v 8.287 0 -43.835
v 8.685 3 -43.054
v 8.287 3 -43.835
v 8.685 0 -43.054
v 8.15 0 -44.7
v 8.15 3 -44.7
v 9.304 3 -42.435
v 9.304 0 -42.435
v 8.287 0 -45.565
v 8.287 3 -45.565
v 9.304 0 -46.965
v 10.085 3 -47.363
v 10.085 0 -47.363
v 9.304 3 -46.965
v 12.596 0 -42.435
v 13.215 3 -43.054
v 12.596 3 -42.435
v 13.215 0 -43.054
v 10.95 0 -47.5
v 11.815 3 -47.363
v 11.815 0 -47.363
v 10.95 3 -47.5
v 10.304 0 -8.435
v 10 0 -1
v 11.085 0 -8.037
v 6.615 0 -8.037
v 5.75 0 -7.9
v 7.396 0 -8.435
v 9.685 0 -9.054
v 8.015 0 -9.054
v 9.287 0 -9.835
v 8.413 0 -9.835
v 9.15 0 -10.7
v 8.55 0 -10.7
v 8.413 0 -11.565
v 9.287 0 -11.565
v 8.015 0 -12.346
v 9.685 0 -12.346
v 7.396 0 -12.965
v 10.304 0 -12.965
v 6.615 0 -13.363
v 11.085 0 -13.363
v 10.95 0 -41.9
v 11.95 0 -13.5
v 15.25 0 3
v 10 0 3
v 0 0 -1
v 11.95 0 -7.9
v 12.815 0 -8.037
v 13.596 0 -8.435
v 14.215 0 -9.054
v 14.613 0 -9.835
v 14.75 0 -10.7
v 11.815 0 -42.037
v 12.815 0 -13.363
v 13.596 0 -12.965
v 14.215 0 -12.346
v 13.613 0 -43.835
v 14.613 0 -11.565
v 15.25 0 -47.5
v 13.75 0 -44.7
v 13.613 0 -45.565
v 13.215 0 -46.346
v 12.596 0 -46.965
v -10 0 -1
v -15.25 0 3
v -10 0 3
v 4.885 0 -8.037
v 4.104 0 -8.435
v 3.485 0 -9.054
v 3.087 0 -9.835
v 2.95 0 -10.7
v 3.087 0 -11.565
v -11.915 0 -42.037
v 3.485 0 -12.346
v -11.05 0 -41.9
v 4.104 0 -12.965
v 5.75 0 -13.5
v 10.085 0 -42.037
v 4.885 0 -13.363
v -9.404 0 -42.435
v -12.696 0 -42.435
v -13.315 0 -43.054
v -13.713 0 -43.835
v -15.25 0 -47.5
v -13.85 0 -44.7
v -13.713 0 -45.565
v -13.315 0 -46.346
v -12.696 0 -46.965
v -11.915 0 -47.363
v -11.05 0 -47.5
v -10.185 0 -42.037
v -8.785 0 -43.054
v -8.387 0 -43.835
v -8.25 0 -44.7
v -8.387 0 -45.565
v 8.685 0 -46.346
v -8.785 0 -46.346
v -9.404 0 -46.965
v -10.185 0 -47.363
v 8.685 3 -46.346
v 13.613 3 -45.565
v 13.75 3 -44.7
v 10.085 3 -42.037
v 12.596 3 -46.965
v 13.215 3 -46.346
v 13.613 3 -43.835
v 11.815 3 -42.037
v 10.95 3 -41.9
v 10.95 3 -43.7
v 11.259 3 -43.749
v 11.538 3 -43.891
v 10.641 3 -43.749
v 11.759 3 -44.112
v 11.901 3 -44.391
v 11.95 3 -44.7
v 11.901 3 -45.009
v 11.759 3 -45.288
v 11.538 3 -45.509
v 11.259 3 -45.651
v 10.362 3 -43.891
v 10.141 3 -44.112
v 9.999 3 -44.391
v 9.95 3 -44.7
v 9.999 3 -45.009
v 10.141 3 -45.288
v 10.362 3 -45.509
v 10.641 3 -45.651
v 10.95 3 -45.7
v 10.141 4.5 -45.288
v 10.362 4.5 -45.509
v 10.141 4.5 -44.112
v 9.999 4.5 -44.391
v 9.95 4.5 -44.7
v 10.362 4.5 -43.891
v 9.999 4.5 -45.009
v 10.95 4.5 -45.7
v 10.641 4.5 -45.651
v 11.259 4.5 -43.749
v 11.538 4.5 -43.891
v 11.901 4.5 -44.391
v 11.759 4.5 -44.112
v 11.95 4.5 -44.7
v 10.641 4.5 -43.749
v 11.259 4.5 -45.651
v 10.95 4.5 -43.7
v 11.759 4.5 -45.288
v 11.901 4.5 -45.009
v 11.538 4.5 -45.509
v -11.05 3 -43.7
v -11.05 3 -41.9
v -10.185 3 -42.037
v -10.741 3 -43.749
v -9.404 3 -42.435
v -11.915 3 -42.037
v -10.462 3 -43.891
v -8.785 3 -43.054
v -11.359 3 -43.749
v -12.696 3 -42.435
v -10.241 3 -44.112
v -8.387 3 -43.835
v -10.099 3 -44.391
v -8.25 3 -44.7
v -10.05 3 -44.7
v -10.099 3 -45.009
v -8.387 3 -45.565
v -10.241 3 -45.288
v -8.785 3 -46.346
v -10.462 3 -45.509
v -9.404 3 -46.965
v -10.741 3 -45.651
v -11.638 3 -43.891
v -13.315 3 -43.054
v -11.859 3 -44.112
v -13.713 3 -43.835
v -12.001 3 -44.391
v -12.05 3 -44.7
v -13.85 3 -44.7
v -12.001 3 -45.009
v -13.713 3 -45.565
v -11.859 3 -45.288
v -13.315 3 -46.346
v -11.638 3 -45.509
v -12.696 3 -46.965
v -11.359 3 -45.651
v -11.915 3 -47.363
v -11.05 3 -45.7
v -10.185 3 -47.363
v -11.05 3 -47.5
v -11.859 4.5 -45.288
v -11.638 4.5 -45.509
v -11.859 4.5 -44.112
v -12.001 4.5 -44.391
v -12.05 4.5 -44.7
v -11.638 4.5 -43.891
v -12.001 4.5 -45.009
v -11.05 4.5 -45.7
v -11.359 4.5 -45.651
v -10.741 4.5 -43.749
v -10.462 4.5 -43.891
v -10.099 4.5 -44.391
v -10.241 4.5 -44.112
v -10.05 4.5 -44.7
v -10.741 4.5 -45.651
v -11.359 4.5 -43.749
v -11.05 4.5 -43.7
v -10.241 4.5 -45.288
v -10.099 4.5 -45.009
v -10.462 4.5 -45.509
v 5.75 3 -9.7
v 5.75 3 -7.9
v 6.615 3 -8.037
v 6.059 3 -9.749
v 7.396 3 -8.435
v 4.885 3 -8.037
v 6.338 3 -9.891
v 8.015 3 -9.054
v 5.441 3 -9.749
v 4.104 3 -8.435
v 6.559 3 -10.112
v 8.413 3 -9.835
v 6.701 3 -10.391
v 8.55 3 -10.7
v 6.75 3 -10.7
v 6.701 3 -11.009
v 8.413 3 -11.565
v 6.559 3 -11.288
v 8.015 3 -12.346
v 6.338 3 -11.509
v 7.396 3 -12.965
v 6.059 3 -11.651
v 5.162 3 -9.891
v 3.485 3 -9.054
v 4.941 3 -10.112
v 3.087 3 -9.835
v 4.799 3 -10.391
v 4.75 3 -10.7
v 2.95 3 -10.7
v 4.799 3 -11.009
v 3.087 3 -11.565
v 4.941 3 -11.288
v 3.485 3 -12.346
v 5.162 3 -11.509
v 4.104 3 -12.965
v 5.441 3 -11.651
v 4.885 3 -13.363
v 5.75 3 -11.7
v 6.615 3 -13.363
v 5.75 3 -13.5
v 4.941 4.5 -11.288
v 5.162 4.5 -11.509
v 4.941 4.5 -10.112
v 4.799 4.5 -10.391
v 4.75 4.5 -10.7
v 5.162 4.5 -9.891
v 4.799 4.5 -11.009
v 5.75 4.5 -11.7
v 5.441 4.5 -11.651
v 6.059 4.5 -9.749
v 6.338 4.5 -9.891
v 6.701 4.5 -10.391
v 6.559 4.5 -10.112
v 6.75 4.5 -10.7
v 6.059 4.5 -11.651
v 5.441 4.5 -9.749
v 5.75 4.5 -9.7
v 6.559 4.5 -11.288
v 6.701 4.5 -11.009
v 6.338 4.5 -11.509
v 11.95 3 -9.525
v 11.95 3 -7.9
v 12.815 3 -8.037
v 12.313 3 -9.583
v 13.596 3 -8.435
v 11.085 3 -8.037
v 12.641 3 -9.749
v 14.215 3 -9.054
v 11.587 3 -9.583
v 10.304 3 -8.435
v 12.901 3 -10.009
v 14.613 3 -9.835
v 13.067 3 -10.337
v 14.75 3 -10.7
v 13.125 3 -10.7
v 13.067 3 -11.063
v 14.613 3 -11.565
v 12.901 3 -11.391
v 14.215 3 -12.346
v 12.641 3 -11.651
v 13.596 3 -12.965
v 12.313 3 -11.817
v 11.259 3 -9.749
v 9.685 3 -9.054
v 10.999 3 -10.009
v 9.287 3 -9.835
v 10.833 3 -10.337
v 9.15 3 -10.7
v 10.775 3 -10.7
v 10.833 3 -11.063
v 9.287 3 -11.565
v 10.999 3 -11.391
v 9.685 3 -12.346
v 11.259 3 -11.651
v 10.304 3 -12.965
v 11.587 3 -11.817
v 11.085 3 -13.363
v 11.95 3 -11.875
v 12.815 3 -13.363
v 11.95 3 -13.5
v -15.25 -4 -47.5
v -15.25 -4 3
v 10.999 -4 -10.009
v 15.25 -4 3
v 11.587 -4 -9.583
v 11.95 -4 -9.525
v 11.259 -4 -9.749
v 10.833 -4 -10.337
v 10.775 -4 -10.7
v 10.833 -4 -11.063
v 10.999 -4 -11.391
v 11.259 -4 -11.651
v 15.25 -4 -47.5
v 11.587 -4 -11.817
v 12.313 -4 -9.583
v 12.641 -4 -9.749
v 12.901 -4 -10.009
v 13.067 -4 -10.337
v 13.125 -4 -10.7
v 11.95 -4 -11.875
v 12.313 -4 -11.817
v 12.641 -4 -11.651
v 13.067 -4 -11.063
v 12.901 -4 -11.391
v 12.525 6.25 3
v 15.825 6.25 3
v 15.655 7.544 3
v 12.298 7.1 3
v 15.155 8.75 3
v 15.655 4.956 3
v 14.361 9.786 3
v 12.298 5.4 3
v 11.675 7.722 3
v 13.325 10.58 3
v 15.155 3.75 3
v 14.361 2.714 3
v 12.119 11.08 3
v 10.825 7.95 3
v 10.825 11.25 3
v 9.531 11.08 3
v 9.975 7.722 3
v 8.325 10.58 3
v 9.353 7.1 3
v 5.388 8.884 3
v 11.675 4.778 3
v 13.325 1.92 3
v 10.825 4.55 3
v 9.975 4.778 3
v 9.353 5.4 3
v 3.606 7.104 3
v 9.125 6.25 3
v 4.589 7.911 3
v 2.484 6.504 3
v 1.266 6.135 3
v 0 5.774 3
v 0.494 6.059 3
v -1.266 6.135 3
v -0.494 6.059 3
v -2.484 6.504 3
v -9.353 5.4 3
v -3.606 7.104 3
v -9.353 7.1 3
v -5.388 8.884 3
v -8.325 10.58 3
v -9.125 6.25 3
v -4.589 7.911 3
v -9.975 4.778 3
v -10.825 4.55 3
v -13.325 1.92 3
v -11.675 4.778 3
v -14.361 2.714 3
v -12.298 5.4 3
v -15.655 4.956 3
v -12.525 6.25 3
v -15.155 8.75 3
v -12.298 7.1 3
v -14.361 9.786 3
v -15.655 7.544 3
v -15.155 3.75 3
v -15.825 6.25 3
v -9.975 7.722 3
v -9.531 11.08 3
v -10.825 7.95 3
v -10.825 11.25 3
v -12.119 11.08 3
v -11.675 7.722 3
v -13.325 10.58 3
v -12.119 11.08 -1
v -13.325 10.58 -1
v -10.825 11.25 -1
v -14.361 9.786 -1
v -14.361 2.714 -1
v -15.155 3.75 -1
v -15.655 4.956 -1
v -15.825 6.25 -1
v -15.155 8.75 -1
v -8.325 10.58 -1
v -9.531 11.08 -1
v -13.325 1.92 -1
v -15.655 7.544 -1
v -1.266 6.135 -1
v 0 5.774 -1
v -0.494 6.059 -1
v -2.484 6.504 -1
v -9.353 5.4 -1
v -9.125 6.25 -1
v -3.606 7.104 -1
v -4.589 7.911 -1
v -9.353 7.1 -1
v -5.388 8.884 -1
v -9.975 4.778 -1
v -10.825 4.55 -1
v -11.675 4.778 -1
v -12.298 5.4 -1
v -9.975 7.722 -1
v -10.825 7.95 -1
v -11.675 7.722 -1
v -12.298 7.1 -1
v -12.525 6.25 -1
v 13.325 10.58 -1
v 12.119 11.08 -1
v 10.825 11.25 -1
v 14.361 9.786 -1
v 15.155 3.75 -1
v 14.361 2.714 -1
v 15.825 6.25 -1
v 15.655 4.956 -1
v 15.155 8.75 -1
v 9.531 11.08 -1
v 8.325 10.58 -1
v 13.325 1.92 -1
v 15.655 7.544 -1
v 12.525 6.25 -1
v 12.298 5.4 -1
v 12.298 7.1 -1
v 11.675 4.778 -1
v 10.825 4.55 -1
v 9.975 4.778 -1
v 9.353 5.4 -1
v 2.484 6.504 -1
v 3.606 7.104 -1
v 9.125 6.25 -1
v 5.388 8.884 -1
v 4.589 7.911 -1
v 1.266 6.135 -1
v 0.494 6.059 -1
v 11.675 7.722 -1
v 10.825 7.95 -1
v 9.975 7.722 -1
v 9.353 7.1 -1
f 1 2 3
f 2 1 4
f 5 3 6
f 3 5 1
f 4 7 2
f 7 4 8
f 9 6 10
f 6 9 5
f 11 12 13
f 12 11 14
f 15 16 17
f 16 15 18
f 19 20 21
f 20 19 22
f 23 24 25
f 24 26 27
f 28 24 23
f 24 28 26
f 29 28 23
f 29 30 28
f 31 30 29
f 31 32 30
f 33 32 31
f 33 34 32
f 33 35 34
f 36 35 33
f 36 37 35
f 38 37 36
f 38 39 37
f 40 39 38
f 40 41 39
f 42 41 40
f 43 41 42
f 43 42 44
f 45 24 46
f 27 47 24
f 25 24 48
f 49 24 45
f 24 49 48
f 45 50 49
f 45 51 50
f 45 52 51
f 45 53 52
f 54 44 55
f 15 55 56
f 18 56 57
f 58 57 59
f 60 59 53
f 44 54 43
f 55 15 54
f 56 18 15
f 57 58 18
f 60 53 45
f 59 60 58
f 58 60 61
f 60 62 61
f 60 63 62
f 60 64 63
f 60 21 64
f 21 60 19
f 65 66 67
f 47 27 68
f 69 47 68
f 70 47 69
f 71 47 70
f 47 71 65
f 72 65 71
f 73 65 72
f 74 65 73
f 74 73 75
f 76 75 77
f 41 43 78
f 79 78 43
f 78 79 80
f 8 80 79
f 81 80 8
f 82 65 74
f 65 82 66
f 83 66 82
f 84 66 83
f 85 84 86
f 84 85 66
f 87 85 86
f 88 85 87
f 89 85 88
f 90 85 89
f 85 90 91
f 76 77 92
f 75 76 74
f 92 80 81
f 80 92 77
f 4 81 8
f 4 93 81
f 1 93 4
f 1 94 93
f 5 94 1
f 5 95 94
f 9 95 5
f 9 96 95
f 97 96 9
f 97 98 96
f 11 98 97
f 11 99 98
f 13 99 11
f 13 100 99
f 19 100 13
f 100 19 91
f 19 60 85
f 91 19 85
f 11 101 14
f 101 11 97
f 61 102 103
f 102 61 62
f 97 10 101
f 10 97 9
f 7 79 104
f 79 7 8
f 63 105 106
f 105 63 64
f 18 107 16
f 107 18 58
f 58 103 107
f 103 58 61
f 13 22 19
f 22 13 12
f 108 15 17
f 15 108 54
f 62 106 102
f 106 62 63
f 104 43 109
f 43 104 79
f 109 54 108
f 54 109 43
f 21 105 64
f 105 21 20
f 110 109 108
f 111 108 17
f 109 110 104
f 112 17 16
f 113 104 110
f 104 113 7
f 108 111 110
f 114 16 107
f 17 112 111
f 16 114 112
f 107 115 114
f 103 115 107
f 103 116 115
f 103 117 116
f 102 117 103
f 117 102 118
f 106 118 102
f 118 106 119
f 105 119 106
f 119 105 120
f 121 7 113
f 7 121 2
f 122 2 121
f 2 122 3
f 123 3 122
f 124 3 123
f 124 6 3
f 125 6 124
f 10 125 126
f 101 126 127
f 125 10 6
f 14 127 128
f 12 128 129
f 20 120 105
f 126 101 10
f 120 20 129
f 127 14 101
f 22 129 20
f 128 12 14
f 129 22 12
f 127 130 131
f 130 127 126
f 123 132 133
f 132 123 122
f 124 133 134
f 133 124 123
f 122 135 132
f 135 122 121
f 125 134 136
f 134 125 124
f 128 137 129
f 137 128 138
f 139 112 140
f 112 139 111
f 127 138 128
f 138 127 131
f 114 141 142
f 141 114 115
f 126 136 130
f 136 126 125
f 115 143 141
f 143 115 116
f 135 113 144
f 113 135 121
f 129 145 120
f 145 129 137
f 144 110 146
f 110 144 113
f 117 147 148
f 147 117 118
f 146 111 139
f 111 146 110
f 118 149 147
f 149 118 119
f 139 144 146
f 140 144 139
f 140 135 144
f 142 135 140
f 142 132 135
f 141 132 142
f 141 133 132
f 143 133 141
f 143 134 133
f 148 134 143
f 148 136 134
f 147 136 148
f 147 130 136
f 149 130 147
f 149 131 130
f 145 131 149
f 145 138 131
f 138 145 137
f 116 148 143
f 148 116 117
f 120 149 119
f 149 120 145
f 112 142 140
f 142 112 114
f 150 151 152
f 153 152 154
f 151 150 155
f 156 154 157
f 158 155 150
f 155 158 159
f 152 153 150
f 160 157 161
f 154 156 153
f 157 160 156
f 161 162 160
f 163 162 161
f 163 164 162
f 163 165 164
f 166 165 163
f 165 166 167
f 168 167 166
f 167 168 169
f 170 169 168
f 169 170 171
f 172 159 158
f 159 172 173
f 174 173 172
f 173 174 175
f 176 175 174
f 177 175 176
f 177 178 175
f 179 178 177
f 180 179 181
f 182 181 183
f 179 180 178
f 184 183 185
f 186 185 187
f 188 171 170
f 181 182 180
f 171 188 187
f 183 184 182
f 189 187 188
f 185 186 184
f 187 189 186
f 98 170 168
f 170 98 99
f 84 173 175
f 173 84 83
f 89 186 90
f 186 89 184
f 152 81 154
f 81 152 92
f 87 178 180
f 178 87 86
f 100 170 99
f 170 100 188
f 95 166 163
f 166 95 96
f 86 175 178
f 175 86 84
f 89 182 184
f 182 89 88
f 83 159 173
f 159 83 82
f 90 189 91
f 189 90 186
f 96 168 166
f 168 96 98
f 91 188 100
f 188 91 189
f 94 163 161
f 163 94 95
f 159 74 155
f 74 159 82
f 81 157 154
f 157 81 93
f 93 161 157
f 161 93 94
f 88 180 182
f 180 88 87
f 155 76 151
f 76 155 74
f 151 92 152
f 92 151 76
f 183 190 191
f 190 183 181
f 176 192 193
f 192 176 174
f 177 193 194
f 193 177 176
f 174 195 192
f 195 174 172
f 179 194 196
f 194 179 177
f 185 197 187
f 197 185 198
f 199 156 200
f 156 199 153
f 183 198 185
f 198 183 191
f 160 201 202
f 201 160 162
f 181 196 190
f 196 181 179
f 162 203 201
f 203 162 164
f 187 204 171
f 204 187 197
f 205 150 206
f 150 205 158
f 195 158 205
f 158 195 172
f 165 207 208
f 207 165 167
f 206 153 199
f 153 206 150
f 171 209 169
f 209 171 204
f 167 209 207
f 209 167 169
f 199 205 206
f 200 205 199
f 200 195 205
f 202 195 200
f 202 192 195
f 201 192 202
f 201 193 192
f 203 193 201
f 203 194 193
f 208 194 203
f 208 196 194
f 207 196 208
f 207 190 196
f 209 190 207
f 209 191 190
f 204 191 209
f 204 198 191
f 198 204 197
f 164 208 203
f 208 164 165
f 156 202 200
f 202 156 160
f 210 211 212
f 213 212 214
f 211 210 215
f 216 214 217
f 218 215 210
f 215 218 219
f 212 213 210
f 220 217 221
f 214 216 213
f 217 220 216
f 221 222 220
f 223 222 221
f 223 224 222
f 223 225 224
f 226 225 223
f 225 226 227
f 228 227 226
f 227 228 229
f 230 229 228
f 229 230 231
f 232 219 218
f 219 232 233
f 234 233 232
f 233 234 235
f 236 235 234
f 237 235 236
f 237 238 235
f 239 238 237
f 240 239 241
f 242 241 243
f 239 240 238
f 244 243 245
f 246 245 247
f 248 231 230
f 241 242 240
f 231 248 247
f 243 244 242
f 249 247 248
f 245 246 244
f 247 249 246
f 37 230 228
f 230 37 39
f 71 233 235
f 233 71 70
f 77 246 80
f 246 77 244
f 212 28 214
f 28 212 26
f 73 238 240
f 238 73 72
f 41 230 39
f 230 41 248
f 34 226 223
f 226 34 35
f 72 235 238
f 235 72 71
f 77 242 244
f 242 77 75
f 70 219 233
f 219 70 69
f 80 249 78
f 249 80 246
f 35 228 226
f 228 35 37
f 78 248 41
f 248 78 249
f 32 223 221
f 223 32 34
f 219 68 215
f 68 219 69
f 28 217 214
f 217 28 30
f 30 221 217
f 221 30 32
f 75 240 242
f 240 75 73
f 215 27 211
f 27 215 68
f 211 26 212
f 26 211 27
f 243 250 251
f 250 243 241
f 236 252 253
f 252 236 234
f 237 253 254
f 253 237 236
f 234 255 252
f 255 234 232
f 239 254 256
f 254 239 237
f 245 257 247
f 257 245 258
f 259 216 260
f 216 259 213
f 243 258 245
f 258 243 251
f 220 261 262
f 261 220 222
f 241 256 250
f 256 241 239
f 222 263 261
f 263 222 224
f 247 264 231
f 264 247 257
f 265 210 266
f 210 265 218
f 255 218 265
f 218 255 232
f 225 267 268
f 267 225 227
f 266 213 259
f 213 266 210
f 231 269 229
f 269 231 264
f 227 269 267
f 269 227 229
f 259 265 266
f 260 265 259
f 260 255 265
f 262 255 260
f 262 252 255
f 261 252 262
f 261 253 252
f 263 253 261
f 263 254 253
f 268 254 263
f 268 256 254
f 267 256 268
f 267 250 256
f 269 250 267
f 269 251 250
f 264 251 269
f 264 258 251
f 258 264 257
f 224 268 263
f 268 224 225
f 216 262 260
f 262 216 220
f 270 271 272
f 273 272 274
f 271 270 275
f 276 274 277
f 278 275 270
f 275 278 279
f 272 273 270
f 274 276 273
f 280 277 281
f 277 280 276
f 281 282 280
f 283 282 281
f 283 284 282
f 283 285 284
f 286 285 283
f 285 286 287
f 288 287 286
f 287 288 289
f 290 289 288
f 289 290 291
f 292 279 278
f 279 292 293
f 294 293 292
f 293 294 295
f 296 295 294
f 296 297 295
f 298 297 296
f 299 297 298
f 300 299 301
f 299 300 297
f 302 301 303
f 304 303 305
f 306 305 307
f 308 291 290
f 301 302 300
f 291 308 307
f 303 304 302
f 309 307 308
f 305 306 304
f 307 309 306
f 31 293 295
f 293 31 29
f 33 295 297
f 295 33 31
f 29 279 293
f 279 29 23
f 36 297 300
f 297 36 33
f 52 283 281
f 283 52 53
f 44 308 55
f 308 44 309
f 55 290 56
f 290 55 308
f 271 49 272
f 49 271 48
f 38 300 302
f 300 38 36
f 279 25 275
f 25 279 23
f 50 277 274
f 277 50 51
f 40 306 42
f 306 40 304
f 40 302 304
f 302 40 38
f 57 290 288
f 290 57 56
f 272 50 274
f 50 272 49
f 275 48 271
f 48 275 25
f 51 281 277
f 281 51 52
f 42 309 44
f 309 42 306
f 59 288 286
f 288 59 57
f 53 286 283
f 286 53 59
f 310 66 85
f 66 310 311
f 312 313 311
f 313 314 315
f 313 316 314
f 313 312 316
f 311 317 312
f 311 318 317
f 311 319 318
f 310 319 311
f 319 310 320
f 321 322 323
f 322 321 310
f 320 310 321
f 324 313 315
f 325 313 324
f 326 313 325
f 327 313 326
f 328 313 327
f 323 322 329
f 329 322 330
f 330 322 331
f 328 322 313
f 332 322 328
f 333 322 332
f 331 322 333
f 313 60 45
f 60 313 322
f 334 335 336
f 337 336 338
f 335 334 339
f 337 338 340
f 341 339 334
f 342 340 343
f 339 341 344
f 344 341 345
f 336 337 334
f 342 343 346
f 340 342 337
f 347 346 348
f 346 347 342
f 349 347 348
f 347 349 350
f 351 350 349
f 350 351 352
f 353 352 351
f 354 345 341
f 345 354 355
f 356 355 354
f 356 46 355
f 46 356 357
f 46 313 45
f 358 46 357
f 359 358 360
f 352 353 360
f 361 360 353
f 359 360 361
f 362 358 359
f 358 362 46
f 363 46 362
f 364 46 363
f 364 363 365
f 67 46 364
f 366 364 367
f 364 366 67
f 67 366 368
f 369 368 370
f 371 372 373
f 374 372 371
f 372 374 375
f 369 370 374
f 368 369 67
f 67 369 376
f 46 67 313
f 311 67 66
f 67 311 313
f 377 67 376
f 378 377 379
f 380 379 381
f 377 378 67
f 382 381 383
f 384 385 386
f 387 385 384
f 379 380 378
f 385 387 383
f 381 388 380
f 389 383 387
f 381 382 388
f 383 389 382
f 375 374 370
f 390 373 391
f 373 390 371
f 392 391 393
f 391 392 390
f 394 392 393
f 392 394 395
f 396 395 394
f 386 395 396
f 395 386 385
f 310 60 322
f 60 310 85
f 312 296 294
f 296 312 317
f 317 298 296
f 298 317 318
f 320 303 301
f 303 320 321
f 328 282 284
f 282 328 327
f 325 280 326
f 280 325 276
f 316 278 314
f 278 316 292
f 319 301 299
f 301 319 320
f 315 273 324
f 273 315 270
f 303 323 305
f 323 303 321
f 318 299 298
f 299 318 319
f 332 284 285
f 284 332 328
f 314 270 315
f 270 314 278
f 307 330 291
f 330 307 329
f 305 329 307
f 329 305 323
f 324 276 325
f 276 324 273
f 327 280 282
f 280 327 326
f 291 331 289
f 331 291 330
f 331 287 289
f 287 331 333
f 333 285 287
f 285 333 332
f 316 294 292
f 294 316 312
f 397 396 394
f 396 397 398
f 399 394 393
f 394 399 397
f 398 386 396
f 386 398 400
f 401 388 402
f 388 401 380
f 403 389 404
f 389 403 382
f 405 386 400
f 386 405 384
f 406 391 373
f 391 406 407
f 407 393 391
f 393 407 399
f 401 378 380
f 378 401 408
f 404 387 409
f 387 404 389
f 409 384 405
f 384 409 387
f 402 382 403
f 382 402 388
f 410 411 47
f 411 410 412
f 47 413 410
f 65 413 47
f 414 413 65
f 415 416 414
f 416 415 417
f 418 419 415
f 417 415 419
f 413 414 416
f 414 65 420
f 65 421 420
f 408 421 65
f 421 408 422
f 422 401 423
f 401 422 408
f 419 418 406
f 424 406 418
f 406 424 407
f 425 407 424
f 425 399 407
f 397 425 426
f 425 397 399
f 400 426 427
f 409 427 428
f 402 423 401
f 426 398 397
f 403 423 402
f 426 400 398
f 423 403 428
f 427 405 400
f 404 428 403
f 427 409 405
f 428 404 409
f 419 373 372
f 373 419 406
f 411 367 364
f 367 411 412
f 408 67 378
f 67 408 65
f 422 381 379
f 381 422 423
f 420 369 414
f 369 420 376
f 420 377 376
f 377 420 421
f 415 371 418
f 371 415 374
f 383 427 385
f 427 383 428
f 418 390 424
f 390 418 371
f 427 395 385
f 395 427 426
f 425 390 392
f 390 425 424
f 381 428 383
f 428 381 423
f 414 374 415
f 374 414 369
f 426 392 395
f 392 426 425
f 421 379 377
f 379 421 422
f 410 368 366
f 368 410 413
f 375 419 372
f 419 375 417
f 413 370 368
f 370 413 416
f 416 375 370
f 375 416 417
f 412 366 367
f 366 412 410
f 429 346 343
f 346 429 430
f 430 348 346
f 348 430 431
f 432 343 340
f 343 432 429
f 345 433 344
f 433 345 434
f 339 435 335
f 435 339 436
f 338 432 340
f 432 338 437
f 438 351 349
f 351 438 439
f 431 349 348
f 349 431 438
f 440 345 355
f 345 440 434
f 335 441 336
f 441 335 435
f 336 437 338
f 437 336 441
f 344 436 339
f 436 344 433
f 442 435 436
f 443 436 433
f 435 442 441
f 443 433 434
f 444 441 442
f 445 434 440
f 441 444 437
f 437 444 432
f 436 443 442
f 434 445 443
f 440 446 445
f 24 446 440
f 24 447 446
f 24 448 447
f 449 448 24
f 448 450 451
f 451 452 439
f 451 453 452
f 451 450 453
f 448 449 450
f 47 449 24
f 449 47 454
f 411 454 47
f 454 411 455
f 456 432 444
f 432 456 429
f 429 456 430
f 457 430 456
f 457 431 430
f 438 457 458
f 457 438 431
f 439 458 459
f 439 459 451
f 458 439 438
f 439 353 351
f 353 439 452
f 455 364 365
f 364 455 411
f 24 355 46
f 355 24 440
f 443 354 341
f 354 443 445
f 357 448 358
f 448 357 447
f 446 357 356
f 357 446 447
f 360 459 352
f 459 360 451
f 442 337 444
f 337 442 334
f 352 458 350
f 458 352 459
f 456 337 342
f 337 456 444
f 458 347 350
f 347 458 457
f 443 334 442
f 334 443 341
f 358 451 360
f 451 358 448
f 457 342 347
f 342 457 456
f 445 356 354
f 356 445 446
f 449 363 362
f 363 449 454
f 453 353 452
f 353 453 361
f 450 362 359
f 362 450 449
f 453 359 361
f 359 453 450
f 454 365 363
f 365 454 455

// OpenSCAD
// file: retractable.scad
include <configuration.scad>;

height = 26;
height2 = 26;
tunnel = 2.4;
face_offset = 4;

module foot() {
  difference() {
    translate([12.5, 0, 0]) rotate([0, 0, -60])
      translate([-12.5, 0, 1]) rotate([0, 0, -60]) union() {
        cylinder(r=5, h=4, center=true, $fn=24);
        translate([10, 0, 0])
          cube([20, 10, 4], center=true);
    }
    translate([0, -10, 0])
      cube([40, 20, 20], center=true);
    translate([12.5, 0, 0]) {
      // Space for bowden push fit connector.
      cylinder(r=6.49, h=3*height, center=true, $fn=32);
      for (a = [60:120:359]) {
	    rotate([0, 0, a]) translate([-12.5, 0, 0])
          cylinder(r=m3_wide_radius, h=20, center=true, $fn=12);
      }
    }
  }
}

module feet()
{
    // Feet for vertical M3 screw attachment.
    rotate([0, 0, 90])
    {
        foot();
        scale([1, -1, 1])
            foot();
    }
}

module ir_mount()
{
    #difference()
    {
        cube([24.5,4,6.3]);
        translate([24.5/2-8.75,10,3.15])
            rotate([90,0,0])
                cylinder(r=no4_pilot_radius,h=20,$fn=12);
        translate([24.5/2+8.75,10,3.15])
            rotate([90,0,0])
                cylinder(r=no4_pilot_radius,h=20,$fn=12);
    }
}

module z_probe()
{
        union()
        {
            // Feet for vertical M3 screw attachment.
            feet();
            // Cutout for threaded rod
            difference()
            {
                translate([0,-13,6])
                    cube([10,4,8],center=true);
                translate([-5,-11,6.5])
                    rotate([90,0,90])
                        cylinder(r=2,h=10,$fn=20);
            }
            // Right angled arm
            translate([-5,-17, -1])
            {
                
                cube([10, 17, 4]);
                difference()
                {
                    cube([10, 4, 40+5]);
                    translate([0.5,0.5,22-16.5+14.5+5])
                    {
                        // Cutout for pins on bottom of pcb
                        #cube([9,3.5,9]);
                    }
                }
            }
            translate([-12.25,-17, 38+5])
            {
                ir_mount();
                  
            }
        }
        

}

//rotate([0,0,90])
//    z_probe();
// file: configuration.scad
// Increase this if your slicer or printer make holes too tight.
extra_radius = 0; // 0.1;

// OD = outside diameter, corner to corner.
m3_nut_od = 6.1;
m3_nut_radius = m3_nut_od/2 + 0.2 + extra_radius;
m3_nut_h = 2.4;
m3_nyloc_h = 3.9;
m3_washer_radius = 3.5 + extra_radius;

m4_nut_od = 7.8;
m4_nut_radius = m4_nut_od/2 + 0.2 + extra_radius;
m4_washer_radius = 4.4 + extra_radius;

// Major diameter of metric 3mm thread.
m3_major = 3;
m3_radius = m3_major/2 + extra_radius;
m3_wide_radius = m3_major/2 + extra_radius + 0.2;

// Major diameter of metric 4mm thread.
m4_major = 4;
m4_radius = m4_major/2 + extra_radius;
m4_wide_radius = m4_major/2 + extra_radius + 0.2;

// M6 Radius
m6_radius = 6/2;

// No4 Self Tapper pilot hole radius
no4_pilot_radius = 2.35/2;

// NEMA17 stepper motors.
motor_shaft_diameter = 5;
motor_shaft_radius = motor_shaft_diameter/2 + extra_radius;

// Frame brackets. M3x8mm screws work best with 3.6 mm brackets.
thickness = 4.0; //3.6 on 1515

// OpenBeam or Misumi. Currently only 15x15 mm, but there is a plan
// to make models more parametric and allow 20x20 mm in the future.
extrusion = 20;

// Placement for the NEMA17 stepper motors.
motor_offset = 44;
motor_length = 47;

separation = 38;  // Distance between ball joint mounting faces.

extrusion_fin_d = 1;

vertex_radius = 40.5; //set to 36 for 1515
vertex_x_offset = 7.25; // offset of the horizontal extrusion to the vertical one in X axis
vertex_y_offset = 39 ;//27; // offset of the horizontal extrusion to the vertical one in Y axis
// main file
include <configuration.scad>;
include <retractable.scad>;

pcb_hole_radius = 1;
pcb_standoff_radius = 2.8;
pcb_width = 30.5;
pcb_height = 50.5;

module standoff()
{
    cylinder(h=3,r=pcb_standoff_radius,$fn=20);
    cylinder(h=4.5,r=pcb_hole_radius,$fn=20);
}

module standoff_st()
{
    cylinder(h=3,r=pcb_standoff_radius,$fn=20);
}

module db9_mount()
{
difference()
{
    union()
    {
        cube([pcb_width,pcb_height,4]);
        translate([4.3,2.8,4])
        {
            standoff();
                translate([22,0,0])
                    standoff();
            translate([-1+6.2,34,0])
                    standoff();
            translate([-1,34,0])
                    standoff_st();
        }
    }
    translate([4.3-1,2.8+34,0])
        cylinder(h=7,r=no4_pilot_radius,$fn=20);
}
}

union()
{
    rotate([90,0,180])
        translate([-pcb_width/2,-pcb_height+3,-4])
            db9_mount();
    difference()
    {
        feet();
        translate([-5,-14,-4])
            cube([10,10,10]);
    }
}
